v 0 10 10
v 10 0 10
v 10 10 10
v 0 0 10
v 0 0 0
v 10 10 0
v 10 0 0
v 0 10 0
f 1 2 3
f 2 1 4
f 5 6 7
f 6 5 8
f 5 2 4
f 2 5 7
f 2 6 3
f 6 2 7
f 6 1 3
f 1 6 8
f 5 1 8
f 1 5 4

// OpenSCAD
// expect: switches this part off
// fix: translate([20, 0, 0]) cube(5);
cube(10);
*translate([20, 0, 0]) cube(5);
